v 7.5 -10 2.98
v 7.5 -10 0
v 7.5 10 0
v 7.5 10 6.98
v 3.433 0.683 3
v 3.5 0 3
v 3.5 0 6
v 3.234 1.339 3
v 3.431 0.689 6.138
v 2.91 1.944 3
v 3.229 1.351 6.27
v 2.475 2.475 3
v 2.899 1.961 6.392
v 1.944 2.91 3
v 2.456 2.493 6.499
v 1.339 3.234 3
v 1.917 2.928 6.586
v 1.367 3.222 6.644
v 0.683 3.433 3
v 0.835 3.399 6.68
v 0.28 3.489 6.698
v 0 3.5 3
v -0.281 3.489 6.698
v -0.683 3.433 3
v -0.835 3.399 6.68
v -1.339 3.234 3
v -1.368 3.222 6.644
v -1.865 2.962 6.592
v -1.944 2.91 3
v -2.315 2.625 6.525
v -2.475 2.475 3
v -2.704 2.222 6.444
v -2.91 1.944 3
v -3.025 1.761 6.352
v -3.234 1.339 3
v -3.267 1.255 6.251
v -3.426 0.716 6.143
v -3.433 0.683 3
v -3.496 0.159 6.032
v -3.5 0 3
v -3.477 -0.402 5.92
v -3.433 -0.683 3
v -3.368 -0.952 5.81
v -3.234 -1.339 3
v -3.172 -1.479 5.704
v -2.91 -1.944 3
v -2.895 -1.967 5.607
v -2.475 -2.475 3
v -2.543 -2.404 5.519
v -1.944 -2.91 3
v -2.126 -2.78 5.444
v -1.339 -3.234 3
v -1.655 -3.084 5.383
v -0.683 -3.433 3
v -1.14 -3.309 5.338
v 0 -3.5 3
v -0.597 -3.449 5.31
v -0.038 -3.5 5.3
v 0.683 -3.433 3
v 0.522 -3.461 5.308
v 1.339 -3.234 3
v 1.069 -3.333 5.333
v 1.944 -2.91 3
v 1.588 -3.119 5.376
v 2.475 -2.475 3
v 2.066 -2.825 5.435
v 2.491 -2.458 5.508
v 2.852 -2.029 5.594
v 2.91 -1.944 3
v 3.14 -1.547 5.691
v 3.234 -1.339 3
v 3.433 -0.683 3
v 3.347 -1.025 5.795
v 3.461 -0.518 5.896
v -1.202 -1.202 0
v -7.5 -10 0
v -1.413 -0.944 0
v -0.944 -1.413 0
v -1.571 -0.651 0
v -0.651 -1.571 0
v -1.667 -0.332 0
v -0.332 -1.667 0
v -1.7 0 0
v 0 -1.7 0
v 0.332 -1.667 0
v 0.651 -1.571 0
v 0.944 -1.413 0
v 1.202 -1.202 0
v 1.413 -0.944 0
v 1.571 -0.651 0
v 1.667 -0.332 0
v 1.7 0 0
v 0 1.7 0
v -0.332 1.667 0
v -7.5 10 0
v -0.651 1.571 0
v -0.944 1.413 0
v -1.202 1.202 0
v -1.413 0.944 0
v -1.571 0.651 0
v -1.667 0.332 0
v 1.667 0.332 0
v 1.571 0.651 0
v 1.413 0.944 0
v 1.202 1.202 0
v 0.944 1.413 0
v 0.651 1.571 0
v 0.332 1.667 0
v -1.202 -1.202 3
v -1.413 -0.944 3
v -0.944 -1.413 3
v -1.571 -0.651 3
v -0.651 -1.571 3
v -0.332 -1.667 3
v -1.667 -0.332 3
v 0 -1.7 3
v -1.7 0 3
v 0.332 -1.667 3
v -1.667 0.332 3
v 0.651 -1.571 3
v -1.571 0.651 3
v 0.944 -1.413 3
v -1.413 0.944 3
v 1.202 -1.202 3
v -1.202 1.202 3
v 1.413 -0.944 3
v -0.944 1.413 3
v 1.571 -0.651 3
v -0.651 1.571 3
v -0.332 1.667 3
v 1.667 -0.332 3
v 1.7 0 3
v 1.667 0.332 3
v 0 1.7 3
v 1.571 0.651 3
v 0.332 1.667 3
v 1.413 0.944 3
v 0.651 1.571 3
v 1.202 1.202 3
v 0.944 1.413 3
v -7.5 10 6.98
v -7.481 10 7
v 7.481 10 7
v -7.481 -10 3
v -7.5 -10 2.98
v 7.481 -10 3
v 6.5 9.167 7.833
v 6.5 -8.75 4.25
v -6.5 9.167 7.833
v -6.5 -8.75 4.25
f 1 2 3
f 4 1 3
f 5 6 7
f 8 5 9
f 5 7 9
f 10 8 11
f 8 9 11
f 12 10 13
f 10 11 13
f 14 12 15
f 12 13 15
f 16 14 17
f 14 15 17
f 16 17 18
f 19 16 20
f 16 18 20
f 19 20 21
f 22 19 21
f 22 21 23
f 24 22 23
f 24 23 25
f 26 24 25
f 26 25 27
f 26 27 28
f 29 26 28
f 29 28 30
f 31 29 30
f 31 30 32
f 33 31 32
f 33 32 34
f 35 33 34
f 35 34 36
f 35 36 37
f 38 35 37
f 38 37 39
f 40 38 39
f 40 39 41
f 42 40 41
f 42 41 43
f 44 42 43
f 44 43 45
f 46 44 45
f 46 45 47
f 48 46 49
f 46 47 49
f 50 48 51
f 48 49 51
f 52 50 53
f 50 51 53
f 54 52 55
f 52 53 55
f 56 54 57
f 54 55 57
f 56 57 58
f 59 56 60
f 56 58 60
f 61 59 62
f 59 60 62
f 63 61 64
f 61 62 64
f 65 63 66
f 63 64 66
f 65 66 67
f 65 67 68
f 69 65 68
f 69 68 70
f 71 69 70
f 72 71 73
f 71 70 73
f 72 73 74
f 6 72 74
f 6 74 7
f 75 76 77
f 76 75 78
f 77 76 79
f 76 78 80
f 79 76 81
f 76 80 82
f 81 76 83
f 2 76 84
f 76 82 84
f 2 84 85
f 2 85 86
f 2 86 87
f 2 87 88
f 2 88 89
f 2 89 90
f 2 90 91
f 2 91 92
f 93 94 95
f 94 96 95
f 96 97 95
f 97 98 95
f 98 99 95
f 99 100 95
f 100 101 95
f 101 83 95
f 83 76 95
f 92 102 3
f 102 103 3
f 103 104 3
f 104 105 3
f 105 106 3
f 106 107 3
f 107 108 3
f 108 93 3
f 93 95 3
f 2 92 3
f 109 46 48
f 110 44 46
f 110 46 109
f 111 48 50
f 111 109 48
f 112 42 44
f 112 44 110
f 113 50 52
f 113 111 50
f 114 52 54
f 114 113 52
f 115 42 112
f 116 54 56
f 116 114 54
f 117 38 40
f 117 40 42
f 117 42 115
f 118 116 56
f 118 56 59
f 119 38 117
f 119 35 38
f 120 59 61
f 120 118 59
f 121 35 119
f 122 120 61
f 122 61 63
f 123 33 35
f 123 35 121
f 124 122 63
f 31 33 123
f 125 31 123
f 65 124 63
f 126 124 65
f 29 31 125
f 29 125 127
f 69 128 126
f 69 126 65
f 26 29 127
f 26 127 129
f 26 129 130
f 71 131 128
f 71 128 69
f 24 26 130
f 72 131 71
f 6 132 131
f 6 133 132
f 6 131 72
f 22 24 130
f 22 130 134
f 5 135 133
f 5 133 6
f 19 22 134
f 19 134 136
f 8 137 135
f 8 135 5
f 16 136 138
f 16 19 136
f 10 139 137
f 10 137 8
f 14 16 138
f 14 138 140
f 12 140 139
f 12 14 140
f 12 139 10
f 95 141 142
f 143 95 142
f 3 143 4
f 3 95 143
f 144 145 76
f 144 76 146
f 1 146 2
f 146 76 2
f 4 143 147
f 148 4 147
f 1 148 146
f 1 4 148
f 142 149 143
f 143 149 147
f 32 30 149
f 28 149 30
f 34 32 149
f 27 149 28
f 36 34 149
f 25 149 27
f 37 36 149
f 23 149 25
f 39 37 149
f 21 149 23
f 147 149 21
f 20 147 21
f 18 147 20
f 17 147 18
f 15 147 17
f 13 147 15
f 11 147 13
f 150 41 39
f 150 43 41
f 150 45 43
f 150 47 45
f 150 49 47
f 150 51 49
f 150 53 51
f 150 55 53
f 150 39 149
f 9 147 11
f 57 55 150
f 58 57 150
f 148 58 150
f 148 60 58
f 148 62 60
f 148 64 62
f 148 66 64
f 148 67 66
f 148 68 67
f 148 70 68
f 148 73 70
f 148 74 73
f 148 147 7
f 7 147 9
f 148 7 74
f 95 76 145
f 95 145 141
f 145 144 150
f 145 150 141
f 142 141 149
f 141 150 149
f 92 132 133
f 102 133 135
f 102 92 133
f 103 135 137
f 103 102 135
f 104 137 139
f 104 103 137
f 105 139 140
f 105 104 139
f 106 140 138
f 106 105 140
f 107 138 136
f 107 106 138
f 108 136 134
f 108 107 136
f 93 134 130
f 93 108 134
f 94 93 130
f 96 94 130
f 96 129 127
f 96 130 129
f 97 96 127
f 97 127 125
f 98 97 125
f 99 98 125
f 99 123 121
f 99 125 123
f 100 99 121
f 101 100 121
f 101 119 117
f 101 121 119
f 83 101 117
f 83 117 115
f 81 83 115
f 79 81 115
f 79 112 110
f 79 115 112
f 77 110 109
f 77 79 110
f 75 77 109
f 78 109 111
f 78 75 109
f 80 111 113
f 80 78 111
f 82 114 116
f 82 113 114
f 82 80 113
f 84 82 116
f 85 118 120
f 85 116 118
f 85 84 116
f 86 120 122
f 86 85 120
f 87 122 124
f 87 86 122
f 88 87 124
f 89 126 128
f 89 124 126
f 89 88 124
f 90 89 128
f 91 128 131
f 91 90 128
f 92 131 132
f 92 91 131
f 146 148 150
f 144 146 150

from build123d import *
from OCP.BRepFilletAPI import BRepFilletAPI_MakeChamfer

# Parameters (mm, degrees)
SKETCH1_W           = 15
SKETCH1_H           = 20
SKETCH1_R           = 1.7
BOSS_EXTRUDE1_DEPTH = 8
SKETCH2_R           = 3.5
CUT_EXTRUDE1_DEPTH  = 5
CUT_EXTRUDE2_DEPTH  = 20.723082923
CHAMFER1_SIZE       = 1
CHAMFER1_SIZE2      = 0.849836586
CHAMFER1_SIZE2_2    = 1.274754878


with BuildPart() as part:
    # Sketch1 → Boss-Extrude1 (new body)
    with BuildSketch(Plane.XY):
        Rectangle(SKETCH1_W, SKETCH1_H)
        Circle(SKETCH1_R, mode=Mode.SUBTRACT)
    extrude(amount=BOSS_EXTRUDE1_DEPTH)

    # Sketch2 → Cut-Extrude1 (cut)
    with BuildSketch(Plane.XY.offset(8)):
        Circle(SKETCH2_R)
    extrude(amount=-CUT_EXTRUDE1_DEPTH, mode=Mode.SUBTRACT)

    # Sketch3 → Cut-Extrude2 (cut, through all)
    with BuildSketch(Plane(origin=(7.5, 0, 0), x_dir=(0, 0, -1), z_dir=(1, 0, 0))):
        Polygon((-8, 10), (-4, -10), (-8, -10), align=None)
    extrude(amount=-CUT_EXTRUDE2_DEPTH, mode=Mode.SUBTRACT)

    # Chamfer1: one chamfer whose edges measure the first distance from different faces: ONE call of the kernel's chamfer builder (chamfer() names one face for all edges)
    chamfer1_edges_1 = [part.edges().sort_by_distance(p)[0] for p in [
        (0, 10, 8),
    ]]
    chamfer1_side_1 = [part.faces().sort_by_distance(p)[0] for p in [
        (0, 10, 4),
    ]]
    chamfer1_edges_2 = [part.edges().sort_by_distance(p)[0] for p in [
        (-7.5, 0, 6),
        (7.5, 0, 6),
    ]]
    chamfer1_edges_3 = [part.edges().sort_by_distance(p)[0] for p in [
        (0, -10, 4),
    ]]
    chamfer1_side_3 = [part.faces().sort_by_distance(p)[0] for p in [
        (0, -10, 2),
    ]]
    chamfer1 = BRepFilletAPI_MakeChamfer(part.part.solid().wrapped)
    for e in chamfer1_edges_1:
        chamfer1.Add(CHAMFER1_SIZE, CHAMFER1_SIZE2, e.wrapped, chamfer1_side_1[0].wrapped)  # the first distance lies on this face
    for e in chamfer1_edges_2:
        chamfer1.Add(CHAMFER1_SIZE, e.wrapped)
    for e in chamfer1_edges_3:
        chamfer1.Add(CHAMFER1_SIZE, CHAMFER1_SIZE2_2, e.wrapped, chamfer1_side_3[0].wrapped)  # the first distance lies on this face
    add(Compound.cast(chamfer1.Shape()), mode=Mode.REPLACE)


solid = part.part
